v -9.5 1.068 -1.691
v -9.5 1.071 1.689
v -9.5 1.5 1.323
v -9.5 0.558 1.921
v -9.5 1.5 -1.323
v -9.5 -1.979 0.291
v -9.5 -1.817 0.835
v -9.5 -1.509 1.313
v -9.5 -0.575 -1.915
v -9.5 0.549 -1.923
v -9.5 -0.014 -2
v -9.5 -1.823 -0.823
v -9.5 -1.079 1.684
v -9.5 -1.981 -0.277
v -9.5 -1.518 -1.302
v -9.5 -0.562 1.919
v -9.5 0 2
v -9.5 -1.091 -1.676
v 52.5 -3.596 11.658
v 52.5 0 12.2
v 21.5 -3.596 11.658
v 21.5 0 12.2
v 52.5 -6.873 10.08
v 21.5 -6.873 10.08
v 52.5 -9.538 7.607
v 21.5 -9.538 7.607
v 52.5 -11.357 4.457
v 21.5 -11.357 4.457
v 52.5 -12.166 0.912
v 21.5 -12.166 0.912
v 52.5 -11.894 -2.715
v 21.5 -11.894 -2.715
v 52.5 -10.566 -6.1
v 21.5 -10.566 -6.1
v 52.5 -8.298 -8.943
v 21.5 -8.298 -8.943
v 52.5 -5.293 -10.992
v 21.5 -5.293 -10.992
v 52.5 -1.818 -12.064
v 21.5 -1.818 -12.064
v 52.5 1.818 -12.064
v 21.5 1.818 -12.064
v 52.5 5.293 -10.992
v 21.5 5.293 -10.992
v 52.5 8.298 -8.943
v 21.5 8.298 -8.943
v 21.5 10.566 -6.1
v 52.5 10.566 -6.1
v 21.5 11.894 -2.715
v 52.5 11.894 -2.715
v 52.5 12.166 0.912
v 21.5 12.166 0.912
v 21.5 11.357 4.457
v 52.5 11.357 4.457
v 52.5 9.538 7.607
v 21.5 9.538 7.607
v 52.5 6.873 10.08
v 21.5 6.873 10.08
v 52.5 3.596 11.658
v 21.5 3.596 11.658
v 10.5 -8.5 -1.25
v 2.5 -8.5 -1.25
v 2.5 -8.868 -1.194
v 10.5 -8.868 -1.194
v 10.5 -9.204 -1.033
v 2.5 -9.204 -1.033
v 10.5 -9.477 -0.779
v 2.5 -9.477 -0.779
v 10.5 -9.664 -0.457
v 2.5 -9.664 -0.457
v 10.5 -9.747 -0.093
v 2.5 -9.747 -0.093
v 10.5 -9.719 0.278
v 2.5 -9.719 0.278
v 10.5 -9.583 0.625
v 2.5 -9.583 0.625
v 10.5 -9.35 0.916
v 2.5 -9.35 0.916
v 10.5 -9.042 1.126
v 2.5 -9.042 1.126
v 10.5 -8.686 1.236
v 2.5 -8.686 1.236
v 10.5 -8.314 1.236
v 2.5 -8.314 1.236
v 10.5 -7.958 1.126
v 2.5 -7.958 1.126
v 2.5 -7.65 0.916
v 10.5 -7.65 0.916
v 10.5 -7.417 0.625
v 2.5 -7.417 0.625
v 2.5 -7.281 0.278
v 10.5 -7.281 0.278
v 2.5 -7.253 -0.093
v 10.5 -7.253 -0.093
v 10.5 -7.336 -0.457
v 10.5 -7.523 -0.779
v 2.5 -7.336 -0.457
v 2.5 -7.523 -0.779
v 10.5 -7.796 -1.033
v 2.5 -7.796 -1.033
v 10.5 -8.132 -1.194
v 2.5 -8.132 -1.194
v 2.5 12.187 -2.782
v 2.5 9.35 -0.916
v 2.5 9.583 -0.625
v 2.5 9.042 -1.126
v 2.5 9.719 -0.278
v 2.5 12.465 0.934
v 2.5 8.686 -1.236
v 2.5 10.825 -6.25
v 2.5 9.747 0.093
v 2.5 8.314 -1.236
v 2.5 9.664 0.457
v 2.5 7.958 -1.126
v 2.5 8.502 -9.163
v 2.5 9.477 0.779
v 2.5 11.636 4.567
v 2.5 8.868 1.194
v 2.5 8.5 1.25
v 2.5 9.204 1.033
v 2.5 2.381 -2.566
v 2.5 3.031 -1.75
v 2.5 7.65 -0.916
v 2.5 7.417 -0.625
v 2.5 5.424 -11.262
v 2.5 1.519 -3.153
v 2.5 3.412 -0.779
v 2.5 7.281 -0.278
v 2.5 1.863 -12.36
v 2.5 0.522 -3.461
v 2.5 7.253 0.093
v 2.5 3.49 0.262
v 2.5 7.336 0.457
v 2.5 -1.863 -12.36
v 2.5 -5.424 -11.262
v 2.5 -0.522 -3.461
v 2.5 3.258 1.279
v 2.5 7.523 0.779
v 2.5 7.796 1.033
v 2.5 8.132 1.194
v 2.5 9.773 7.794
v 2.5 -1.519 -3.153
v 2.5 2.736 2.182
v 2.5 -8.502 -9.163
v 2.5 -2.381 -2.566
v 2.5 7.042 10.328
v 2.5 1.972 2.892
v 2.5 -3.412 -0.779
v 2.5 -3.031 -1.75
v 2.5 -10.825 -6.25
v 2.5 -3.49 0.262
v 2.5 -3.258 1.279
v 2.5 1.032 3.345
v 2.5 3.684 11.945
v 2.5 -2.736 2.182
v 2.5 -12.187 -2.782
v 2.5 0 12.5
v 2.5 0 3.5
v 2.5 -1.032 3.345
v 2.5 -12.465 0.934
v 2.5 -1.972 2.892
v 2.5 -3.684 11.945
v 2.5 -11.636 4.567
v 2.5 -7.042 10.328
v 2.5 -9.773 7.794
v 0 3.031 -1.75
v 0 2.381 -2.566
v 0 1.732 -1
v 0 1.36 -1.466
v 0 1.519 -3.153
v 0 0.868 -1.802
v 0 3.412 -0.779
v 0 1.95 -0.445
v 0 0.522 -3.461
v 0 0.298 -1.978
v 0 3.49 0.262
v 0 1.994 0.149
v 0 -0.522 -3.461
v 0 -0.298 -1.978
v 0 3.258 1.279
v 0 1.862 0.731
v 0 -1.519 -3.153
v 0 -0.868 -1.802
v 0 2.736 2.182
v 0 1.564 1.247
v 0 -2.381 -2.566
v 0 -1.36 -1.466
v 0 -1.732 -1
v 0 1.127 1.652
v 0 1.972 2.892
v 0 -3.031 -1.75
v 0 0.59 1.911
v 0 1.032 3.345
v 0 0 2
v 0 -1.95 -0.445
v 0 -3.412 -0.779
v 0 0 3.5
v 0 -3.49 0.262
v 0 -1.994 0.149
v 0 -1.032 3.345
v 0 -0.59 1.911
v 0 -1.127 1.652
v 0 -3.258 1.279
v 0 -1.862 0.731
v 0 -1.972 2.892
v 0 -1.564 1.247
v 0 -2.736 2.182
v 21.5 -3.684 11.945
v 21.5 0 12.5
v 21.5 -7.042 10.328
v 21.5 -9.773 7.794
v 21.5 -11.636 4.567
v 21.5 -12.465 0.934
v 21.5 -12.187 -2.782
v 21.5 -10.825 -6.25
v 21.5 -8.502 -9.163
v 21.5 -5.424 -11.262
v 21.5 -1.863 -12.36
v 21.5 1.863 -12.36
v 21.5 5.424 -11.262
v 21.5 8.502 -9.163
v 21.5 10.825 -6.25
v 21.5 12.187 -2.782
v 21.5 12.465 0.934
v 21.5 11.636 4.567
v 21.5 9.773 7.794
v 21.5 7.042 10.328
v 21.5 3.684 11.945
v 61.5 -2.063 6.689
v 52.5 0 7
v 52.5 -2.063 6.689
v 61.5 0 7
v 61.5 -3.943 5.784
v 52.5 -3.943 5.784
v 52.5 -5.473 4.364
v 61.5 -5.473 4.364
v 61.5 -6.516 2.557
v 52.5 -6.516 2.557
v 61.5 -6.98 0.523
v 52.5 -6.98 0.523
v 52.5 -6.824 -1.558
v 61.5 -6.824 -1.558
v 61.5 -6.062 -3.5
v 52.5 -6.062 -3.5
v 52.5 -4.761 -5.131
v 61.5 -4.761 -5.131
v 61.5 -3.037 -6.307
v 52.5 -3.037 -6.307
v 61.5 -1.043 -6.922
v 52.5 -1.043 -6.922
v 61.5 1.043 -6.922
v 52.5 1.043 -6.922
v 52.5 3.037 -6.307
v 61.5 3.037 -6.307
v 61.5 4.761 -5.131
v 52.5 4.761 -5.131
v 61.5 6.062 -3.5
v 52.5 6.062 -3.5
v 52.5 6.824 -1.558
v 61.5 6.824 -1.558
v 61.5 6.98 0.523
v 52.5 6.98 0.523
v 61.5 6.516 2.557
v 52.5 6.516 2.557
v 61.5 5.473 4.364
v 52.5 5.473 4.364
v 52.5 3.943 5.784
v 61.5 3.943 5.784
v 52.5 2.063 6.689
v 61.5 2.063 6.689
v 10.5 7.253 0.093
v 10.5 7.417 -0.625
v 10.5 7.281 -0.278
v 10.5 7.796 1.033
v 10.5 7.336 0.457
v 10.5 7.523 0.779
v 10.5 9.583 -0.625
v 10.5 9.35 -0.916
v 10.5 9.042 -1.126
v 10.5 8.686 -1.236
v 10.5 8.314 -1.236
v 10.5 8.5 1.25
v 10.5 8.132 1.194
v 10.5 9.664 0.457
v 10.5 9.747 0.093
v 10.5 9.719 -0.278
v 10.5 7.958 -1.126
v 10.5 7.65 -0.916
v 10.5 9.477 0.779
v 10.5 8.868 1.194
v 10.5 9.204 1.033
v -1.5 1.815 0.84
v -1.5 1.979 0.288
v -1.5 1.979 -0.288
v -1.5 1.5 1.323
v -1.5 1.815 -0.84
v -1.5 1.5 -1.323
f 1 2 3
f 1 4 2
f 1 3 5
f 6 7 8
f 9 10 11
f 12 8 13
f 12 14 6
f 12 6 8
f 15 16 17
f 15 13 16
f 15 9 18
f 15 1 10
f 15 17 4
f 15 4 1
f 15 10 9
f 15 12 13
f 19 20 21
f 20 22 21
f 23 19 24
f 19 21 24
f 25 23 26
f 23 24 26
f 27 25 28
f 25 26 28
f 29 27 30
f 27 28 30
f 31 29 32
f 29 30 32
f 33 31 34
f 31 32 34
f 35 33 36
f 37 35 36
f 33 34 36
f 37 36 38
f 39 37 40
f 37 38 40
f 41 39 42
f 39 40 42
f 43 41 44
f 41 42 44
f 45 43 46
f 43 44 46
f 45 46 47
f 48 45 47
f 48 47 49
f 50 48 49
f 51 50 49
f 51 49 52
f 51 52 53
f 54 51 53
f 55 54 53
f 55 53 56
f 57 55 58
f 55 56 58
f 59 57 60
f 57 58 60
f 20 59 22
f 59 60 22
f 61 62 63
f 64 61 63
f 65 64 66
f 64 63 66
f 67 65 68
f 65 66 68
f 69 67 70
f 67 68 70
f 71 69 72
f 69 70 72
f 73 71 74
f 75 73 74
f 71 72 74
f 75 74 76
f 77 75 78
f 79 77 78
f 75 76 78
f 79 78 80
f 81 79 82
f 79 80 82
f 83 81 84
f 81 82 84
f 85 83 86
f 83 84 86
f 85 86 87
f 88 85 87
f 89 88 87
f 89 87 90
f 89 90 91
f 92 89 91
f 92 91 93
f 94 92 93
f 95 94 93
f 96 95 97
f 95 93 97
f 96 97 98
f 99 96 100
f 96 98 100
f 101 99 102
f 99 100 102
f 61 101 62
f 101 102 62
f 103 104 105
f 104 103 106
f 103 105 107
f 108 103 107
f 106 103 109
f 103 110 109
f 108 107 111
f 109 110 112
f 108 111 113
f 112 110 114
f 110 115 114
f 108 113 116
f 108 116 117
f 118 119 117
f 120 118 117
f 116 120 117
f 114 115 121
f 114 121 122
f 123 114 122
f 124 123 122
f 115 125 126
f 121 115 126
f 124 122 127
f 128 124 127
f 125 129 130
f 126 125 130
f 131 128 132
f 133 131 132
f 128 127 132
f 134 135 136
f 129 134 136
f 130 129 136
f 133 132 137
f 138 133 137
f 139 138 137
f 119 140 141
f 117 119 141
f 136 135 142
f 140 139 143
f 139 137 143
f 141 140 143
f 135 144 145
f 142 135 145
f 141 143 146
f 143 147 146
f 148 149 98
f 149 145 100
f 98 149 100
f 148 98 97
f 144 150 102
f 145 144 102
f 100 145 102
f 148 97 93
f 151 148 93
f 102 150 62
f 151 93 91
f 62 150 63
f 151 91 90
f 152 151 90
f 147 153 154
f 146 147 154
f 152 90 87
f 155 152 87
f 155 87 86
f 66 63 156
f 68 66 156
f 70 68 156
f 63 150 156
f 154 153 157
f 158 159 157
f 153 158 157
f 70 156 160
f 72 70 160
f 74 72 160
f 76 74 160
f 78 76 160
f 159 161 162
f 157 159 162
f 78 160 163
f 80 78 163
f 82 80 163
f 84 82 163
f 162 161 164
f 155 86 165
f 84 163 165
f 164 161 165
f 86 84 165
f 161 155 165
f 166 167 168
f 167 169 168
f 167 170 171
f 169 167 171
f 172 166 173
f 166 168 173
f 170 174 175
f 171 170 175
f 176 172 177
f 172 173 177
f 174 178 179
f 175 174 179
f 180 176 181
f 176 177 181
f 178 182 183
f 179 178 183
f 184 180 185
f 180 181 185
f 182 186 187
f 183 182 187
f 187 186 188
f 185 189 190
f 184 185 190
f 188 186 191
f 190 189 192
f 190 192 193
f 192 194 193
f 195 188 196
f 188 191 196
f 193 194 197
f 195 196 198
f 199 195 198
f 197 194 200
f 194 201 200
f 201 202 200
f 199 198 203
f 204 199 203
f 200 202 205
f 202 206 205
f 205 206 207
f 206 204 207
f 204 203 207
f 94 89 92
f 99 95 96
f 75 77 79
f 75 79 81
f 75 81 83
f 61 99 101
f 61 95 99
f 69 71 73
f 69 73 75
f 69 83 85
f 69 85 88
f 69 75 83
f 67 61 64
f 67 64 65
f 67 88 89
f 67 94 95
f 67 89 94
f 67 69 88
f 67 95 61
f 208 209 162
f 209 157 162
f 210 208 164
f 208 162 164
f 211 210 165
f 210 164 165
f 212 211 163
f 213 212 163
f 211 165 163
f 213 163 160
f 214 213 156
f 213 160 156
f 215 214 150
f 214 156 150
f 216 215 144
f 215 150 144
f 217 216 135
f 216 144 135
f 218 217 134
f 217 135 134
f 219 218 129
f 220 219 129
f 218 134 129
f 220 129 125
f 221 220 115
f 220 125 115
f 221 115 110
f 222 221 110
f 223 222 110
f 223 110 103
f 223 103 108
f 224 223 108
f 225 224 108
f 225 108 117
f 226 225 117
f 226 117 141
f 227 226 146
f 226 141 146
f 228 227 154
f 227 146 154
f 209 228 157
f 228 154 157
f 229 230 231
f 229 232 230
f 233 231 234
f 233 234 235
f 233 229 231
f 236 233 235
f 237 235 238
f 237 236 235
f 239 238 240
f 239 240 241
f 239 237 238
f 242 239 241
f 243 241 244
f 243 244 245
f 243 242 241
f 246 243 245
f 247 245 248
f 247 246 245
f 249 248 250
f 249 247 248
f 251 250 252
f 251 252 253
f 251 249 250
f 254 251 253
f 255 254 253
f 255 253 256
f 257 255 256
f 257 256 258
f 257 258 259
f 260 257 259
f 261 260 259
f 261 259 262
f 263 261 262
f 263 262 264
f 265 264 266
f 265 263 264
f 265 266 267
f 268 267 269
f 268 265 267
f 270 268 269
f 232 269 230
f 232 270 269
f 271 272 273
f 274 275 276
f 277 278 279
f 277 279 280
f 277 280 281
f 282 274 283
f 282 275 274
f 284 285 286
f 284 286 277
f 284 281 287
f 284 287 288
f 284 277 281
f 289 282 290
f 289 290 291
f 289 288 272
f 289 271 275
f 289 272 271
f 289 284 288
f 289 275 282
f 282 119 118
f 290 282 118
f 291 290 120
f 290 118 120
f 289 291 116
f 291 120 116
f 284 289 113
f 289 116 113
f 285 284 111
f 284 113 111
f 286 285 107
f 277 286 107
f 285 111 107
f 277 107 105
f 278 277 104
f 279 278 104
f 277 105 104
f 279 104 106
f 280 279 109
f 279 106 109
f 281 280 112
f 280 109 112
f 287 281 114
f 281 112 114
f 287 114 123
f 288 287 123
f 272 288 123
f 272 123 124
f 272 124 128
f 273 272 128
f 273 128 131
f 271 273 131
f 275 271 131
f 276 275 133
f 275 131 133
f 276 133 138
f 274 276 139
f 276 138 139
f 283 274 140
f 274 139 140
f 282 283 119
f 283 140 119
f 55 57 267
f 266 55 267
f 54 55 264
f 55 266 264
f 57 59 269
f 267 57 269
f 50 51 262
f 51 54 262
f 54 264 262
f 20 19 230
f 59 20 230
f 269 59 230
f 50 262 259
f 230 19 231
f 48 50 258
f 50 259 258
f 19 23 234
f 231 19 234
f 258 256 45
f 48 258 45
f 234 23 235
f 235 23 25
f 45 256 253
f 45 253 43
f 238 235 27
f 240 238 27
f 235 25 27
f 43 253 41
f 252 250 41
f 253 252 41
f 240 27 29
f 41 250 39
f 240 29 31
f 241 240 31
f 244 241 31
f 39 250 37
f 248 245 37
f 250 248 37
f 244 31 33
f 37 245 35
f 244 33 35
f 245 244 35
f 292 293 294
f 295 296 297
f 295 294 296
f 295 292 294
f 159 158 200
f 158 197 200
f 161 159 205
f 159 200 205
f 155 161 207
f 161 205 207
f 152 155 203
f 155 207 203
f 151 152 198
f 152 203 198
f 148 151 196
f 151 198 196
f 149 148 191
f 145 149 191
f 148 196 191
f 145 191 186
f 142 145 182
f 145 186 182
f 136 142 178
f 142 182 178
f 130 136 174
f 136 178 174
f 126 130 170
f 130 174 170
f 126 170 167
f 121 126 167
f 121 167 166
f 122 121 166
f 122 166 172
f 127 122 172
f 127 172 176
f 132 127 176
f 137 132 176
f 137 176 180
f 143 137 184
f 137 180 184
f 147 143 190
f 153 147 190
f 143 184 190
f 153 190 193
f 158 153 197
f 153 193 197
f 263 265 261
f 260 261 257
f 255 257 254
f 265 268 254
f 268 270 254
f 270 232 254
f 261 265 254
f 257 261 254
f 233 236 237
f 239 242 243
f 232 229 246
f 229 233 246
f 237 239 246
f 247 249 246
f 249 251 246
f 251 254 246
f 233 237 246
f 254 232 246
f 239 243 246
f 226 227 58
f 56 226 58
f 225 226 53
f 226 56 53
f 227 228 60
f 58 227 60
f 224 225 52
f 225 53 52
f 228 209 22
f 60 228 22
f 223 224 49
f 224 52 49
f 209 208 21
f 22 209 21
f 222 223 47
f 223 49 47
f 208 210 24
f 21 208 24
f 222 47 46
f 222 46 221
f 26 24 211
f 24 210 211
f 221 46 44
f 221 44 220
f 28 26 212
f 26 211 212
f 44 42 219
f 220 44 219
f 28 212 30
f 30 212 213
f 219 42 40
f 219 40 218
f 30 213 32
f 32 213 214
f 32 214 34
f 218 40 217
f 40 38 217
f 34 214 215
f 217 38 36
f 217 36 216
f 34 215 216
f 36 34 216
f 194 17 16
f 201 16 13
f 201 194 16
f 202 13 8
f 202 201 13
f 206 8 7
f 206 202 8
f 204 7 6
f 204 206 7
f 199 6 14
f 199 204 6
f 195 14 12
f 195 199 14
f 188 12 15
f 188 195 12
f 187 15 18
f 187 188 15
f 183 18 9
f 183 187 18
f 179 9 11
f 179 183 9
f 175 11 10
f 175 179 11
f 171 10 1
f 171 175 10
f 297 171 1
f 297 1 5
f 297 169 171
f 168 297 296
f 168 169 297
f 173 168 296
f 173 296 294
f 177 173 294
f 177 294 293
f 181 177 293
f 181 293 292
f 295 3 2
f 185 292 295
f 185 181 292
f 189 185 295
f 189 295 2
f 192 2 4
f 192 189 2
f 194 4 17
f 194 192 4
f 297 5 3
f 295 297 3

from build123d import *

# Parameters (mm, degrees)
SKETCH1_W          = 9.5
SKETCH1_H          = 2
SKETCH1_W_2        = 9
SKETCH1_H_2        = 7
SKETCH2_W          = 4
SKETCH2_H          = 0.5
CUT_EXTRUDE1_DEPTH = 8
SKETCH3_R          = 1.25
CUT_EXTRUDE2_DEPTH = 8


with BuildPart() as part:
    # Sketch1 → Revolve1 (revolve)
    with BuildSketch(Plane.XY, mode=Mode.PRIVATE) as revolve1_sk:
        with Locations((-4.75, 1)):
            Rectangle(SKETCH1_W, SKETCH1_H)
        Polygon((0, 2), (0, 0), (21.5, 0), (21.5, 12.2), (21.5, 12.5), (2.5, 12.5), (2.5, 3.5), (0, 3.5), align=None)
        Polygon((21.5, 12.2), (21.5, 0), (52.5, 0), (52.5, 7), (52.5, 12.2), align=None)
        with Locations((57, 3.5)):
            Rectangle(SKETCH1_W_2, SKETCH1_H_2)
    revolve(revolve1_sk.sketch.rotate(Axis((0, 0, 0), (1, 0, 0)), 90), axis=Axis((0, 0, 0), (1, 0, 0)))

    # Sketch2 → Cut-Extrude1 (cut)
    with BuildSketch(Plane.ZY.offset(9.5)):
        with Locations((0, 1.75)):
            Rectangle(SKETCH2_W, SKETCH2_H)
    extrude(amount=-CUT_EXTRUDE1_DEPTH, mode=Mode.SUBTRACT)

    # Sketch3 → Cut-Extrude2 (cut)
    with BuildSketch(Plane.ZY.offset(-2.5)):
        with Locations((0, 8.5)):
            Circle(SKETCH3_R)
        with Locations(Location((0, -8.5, 0), (0, 0, 180))):
            Circle(SKETCH3_R)
    extrude(amount=-CUT_EXTRUDE2_DEPTH, mode=Mode.SUBTRACT)


solid = part.part
